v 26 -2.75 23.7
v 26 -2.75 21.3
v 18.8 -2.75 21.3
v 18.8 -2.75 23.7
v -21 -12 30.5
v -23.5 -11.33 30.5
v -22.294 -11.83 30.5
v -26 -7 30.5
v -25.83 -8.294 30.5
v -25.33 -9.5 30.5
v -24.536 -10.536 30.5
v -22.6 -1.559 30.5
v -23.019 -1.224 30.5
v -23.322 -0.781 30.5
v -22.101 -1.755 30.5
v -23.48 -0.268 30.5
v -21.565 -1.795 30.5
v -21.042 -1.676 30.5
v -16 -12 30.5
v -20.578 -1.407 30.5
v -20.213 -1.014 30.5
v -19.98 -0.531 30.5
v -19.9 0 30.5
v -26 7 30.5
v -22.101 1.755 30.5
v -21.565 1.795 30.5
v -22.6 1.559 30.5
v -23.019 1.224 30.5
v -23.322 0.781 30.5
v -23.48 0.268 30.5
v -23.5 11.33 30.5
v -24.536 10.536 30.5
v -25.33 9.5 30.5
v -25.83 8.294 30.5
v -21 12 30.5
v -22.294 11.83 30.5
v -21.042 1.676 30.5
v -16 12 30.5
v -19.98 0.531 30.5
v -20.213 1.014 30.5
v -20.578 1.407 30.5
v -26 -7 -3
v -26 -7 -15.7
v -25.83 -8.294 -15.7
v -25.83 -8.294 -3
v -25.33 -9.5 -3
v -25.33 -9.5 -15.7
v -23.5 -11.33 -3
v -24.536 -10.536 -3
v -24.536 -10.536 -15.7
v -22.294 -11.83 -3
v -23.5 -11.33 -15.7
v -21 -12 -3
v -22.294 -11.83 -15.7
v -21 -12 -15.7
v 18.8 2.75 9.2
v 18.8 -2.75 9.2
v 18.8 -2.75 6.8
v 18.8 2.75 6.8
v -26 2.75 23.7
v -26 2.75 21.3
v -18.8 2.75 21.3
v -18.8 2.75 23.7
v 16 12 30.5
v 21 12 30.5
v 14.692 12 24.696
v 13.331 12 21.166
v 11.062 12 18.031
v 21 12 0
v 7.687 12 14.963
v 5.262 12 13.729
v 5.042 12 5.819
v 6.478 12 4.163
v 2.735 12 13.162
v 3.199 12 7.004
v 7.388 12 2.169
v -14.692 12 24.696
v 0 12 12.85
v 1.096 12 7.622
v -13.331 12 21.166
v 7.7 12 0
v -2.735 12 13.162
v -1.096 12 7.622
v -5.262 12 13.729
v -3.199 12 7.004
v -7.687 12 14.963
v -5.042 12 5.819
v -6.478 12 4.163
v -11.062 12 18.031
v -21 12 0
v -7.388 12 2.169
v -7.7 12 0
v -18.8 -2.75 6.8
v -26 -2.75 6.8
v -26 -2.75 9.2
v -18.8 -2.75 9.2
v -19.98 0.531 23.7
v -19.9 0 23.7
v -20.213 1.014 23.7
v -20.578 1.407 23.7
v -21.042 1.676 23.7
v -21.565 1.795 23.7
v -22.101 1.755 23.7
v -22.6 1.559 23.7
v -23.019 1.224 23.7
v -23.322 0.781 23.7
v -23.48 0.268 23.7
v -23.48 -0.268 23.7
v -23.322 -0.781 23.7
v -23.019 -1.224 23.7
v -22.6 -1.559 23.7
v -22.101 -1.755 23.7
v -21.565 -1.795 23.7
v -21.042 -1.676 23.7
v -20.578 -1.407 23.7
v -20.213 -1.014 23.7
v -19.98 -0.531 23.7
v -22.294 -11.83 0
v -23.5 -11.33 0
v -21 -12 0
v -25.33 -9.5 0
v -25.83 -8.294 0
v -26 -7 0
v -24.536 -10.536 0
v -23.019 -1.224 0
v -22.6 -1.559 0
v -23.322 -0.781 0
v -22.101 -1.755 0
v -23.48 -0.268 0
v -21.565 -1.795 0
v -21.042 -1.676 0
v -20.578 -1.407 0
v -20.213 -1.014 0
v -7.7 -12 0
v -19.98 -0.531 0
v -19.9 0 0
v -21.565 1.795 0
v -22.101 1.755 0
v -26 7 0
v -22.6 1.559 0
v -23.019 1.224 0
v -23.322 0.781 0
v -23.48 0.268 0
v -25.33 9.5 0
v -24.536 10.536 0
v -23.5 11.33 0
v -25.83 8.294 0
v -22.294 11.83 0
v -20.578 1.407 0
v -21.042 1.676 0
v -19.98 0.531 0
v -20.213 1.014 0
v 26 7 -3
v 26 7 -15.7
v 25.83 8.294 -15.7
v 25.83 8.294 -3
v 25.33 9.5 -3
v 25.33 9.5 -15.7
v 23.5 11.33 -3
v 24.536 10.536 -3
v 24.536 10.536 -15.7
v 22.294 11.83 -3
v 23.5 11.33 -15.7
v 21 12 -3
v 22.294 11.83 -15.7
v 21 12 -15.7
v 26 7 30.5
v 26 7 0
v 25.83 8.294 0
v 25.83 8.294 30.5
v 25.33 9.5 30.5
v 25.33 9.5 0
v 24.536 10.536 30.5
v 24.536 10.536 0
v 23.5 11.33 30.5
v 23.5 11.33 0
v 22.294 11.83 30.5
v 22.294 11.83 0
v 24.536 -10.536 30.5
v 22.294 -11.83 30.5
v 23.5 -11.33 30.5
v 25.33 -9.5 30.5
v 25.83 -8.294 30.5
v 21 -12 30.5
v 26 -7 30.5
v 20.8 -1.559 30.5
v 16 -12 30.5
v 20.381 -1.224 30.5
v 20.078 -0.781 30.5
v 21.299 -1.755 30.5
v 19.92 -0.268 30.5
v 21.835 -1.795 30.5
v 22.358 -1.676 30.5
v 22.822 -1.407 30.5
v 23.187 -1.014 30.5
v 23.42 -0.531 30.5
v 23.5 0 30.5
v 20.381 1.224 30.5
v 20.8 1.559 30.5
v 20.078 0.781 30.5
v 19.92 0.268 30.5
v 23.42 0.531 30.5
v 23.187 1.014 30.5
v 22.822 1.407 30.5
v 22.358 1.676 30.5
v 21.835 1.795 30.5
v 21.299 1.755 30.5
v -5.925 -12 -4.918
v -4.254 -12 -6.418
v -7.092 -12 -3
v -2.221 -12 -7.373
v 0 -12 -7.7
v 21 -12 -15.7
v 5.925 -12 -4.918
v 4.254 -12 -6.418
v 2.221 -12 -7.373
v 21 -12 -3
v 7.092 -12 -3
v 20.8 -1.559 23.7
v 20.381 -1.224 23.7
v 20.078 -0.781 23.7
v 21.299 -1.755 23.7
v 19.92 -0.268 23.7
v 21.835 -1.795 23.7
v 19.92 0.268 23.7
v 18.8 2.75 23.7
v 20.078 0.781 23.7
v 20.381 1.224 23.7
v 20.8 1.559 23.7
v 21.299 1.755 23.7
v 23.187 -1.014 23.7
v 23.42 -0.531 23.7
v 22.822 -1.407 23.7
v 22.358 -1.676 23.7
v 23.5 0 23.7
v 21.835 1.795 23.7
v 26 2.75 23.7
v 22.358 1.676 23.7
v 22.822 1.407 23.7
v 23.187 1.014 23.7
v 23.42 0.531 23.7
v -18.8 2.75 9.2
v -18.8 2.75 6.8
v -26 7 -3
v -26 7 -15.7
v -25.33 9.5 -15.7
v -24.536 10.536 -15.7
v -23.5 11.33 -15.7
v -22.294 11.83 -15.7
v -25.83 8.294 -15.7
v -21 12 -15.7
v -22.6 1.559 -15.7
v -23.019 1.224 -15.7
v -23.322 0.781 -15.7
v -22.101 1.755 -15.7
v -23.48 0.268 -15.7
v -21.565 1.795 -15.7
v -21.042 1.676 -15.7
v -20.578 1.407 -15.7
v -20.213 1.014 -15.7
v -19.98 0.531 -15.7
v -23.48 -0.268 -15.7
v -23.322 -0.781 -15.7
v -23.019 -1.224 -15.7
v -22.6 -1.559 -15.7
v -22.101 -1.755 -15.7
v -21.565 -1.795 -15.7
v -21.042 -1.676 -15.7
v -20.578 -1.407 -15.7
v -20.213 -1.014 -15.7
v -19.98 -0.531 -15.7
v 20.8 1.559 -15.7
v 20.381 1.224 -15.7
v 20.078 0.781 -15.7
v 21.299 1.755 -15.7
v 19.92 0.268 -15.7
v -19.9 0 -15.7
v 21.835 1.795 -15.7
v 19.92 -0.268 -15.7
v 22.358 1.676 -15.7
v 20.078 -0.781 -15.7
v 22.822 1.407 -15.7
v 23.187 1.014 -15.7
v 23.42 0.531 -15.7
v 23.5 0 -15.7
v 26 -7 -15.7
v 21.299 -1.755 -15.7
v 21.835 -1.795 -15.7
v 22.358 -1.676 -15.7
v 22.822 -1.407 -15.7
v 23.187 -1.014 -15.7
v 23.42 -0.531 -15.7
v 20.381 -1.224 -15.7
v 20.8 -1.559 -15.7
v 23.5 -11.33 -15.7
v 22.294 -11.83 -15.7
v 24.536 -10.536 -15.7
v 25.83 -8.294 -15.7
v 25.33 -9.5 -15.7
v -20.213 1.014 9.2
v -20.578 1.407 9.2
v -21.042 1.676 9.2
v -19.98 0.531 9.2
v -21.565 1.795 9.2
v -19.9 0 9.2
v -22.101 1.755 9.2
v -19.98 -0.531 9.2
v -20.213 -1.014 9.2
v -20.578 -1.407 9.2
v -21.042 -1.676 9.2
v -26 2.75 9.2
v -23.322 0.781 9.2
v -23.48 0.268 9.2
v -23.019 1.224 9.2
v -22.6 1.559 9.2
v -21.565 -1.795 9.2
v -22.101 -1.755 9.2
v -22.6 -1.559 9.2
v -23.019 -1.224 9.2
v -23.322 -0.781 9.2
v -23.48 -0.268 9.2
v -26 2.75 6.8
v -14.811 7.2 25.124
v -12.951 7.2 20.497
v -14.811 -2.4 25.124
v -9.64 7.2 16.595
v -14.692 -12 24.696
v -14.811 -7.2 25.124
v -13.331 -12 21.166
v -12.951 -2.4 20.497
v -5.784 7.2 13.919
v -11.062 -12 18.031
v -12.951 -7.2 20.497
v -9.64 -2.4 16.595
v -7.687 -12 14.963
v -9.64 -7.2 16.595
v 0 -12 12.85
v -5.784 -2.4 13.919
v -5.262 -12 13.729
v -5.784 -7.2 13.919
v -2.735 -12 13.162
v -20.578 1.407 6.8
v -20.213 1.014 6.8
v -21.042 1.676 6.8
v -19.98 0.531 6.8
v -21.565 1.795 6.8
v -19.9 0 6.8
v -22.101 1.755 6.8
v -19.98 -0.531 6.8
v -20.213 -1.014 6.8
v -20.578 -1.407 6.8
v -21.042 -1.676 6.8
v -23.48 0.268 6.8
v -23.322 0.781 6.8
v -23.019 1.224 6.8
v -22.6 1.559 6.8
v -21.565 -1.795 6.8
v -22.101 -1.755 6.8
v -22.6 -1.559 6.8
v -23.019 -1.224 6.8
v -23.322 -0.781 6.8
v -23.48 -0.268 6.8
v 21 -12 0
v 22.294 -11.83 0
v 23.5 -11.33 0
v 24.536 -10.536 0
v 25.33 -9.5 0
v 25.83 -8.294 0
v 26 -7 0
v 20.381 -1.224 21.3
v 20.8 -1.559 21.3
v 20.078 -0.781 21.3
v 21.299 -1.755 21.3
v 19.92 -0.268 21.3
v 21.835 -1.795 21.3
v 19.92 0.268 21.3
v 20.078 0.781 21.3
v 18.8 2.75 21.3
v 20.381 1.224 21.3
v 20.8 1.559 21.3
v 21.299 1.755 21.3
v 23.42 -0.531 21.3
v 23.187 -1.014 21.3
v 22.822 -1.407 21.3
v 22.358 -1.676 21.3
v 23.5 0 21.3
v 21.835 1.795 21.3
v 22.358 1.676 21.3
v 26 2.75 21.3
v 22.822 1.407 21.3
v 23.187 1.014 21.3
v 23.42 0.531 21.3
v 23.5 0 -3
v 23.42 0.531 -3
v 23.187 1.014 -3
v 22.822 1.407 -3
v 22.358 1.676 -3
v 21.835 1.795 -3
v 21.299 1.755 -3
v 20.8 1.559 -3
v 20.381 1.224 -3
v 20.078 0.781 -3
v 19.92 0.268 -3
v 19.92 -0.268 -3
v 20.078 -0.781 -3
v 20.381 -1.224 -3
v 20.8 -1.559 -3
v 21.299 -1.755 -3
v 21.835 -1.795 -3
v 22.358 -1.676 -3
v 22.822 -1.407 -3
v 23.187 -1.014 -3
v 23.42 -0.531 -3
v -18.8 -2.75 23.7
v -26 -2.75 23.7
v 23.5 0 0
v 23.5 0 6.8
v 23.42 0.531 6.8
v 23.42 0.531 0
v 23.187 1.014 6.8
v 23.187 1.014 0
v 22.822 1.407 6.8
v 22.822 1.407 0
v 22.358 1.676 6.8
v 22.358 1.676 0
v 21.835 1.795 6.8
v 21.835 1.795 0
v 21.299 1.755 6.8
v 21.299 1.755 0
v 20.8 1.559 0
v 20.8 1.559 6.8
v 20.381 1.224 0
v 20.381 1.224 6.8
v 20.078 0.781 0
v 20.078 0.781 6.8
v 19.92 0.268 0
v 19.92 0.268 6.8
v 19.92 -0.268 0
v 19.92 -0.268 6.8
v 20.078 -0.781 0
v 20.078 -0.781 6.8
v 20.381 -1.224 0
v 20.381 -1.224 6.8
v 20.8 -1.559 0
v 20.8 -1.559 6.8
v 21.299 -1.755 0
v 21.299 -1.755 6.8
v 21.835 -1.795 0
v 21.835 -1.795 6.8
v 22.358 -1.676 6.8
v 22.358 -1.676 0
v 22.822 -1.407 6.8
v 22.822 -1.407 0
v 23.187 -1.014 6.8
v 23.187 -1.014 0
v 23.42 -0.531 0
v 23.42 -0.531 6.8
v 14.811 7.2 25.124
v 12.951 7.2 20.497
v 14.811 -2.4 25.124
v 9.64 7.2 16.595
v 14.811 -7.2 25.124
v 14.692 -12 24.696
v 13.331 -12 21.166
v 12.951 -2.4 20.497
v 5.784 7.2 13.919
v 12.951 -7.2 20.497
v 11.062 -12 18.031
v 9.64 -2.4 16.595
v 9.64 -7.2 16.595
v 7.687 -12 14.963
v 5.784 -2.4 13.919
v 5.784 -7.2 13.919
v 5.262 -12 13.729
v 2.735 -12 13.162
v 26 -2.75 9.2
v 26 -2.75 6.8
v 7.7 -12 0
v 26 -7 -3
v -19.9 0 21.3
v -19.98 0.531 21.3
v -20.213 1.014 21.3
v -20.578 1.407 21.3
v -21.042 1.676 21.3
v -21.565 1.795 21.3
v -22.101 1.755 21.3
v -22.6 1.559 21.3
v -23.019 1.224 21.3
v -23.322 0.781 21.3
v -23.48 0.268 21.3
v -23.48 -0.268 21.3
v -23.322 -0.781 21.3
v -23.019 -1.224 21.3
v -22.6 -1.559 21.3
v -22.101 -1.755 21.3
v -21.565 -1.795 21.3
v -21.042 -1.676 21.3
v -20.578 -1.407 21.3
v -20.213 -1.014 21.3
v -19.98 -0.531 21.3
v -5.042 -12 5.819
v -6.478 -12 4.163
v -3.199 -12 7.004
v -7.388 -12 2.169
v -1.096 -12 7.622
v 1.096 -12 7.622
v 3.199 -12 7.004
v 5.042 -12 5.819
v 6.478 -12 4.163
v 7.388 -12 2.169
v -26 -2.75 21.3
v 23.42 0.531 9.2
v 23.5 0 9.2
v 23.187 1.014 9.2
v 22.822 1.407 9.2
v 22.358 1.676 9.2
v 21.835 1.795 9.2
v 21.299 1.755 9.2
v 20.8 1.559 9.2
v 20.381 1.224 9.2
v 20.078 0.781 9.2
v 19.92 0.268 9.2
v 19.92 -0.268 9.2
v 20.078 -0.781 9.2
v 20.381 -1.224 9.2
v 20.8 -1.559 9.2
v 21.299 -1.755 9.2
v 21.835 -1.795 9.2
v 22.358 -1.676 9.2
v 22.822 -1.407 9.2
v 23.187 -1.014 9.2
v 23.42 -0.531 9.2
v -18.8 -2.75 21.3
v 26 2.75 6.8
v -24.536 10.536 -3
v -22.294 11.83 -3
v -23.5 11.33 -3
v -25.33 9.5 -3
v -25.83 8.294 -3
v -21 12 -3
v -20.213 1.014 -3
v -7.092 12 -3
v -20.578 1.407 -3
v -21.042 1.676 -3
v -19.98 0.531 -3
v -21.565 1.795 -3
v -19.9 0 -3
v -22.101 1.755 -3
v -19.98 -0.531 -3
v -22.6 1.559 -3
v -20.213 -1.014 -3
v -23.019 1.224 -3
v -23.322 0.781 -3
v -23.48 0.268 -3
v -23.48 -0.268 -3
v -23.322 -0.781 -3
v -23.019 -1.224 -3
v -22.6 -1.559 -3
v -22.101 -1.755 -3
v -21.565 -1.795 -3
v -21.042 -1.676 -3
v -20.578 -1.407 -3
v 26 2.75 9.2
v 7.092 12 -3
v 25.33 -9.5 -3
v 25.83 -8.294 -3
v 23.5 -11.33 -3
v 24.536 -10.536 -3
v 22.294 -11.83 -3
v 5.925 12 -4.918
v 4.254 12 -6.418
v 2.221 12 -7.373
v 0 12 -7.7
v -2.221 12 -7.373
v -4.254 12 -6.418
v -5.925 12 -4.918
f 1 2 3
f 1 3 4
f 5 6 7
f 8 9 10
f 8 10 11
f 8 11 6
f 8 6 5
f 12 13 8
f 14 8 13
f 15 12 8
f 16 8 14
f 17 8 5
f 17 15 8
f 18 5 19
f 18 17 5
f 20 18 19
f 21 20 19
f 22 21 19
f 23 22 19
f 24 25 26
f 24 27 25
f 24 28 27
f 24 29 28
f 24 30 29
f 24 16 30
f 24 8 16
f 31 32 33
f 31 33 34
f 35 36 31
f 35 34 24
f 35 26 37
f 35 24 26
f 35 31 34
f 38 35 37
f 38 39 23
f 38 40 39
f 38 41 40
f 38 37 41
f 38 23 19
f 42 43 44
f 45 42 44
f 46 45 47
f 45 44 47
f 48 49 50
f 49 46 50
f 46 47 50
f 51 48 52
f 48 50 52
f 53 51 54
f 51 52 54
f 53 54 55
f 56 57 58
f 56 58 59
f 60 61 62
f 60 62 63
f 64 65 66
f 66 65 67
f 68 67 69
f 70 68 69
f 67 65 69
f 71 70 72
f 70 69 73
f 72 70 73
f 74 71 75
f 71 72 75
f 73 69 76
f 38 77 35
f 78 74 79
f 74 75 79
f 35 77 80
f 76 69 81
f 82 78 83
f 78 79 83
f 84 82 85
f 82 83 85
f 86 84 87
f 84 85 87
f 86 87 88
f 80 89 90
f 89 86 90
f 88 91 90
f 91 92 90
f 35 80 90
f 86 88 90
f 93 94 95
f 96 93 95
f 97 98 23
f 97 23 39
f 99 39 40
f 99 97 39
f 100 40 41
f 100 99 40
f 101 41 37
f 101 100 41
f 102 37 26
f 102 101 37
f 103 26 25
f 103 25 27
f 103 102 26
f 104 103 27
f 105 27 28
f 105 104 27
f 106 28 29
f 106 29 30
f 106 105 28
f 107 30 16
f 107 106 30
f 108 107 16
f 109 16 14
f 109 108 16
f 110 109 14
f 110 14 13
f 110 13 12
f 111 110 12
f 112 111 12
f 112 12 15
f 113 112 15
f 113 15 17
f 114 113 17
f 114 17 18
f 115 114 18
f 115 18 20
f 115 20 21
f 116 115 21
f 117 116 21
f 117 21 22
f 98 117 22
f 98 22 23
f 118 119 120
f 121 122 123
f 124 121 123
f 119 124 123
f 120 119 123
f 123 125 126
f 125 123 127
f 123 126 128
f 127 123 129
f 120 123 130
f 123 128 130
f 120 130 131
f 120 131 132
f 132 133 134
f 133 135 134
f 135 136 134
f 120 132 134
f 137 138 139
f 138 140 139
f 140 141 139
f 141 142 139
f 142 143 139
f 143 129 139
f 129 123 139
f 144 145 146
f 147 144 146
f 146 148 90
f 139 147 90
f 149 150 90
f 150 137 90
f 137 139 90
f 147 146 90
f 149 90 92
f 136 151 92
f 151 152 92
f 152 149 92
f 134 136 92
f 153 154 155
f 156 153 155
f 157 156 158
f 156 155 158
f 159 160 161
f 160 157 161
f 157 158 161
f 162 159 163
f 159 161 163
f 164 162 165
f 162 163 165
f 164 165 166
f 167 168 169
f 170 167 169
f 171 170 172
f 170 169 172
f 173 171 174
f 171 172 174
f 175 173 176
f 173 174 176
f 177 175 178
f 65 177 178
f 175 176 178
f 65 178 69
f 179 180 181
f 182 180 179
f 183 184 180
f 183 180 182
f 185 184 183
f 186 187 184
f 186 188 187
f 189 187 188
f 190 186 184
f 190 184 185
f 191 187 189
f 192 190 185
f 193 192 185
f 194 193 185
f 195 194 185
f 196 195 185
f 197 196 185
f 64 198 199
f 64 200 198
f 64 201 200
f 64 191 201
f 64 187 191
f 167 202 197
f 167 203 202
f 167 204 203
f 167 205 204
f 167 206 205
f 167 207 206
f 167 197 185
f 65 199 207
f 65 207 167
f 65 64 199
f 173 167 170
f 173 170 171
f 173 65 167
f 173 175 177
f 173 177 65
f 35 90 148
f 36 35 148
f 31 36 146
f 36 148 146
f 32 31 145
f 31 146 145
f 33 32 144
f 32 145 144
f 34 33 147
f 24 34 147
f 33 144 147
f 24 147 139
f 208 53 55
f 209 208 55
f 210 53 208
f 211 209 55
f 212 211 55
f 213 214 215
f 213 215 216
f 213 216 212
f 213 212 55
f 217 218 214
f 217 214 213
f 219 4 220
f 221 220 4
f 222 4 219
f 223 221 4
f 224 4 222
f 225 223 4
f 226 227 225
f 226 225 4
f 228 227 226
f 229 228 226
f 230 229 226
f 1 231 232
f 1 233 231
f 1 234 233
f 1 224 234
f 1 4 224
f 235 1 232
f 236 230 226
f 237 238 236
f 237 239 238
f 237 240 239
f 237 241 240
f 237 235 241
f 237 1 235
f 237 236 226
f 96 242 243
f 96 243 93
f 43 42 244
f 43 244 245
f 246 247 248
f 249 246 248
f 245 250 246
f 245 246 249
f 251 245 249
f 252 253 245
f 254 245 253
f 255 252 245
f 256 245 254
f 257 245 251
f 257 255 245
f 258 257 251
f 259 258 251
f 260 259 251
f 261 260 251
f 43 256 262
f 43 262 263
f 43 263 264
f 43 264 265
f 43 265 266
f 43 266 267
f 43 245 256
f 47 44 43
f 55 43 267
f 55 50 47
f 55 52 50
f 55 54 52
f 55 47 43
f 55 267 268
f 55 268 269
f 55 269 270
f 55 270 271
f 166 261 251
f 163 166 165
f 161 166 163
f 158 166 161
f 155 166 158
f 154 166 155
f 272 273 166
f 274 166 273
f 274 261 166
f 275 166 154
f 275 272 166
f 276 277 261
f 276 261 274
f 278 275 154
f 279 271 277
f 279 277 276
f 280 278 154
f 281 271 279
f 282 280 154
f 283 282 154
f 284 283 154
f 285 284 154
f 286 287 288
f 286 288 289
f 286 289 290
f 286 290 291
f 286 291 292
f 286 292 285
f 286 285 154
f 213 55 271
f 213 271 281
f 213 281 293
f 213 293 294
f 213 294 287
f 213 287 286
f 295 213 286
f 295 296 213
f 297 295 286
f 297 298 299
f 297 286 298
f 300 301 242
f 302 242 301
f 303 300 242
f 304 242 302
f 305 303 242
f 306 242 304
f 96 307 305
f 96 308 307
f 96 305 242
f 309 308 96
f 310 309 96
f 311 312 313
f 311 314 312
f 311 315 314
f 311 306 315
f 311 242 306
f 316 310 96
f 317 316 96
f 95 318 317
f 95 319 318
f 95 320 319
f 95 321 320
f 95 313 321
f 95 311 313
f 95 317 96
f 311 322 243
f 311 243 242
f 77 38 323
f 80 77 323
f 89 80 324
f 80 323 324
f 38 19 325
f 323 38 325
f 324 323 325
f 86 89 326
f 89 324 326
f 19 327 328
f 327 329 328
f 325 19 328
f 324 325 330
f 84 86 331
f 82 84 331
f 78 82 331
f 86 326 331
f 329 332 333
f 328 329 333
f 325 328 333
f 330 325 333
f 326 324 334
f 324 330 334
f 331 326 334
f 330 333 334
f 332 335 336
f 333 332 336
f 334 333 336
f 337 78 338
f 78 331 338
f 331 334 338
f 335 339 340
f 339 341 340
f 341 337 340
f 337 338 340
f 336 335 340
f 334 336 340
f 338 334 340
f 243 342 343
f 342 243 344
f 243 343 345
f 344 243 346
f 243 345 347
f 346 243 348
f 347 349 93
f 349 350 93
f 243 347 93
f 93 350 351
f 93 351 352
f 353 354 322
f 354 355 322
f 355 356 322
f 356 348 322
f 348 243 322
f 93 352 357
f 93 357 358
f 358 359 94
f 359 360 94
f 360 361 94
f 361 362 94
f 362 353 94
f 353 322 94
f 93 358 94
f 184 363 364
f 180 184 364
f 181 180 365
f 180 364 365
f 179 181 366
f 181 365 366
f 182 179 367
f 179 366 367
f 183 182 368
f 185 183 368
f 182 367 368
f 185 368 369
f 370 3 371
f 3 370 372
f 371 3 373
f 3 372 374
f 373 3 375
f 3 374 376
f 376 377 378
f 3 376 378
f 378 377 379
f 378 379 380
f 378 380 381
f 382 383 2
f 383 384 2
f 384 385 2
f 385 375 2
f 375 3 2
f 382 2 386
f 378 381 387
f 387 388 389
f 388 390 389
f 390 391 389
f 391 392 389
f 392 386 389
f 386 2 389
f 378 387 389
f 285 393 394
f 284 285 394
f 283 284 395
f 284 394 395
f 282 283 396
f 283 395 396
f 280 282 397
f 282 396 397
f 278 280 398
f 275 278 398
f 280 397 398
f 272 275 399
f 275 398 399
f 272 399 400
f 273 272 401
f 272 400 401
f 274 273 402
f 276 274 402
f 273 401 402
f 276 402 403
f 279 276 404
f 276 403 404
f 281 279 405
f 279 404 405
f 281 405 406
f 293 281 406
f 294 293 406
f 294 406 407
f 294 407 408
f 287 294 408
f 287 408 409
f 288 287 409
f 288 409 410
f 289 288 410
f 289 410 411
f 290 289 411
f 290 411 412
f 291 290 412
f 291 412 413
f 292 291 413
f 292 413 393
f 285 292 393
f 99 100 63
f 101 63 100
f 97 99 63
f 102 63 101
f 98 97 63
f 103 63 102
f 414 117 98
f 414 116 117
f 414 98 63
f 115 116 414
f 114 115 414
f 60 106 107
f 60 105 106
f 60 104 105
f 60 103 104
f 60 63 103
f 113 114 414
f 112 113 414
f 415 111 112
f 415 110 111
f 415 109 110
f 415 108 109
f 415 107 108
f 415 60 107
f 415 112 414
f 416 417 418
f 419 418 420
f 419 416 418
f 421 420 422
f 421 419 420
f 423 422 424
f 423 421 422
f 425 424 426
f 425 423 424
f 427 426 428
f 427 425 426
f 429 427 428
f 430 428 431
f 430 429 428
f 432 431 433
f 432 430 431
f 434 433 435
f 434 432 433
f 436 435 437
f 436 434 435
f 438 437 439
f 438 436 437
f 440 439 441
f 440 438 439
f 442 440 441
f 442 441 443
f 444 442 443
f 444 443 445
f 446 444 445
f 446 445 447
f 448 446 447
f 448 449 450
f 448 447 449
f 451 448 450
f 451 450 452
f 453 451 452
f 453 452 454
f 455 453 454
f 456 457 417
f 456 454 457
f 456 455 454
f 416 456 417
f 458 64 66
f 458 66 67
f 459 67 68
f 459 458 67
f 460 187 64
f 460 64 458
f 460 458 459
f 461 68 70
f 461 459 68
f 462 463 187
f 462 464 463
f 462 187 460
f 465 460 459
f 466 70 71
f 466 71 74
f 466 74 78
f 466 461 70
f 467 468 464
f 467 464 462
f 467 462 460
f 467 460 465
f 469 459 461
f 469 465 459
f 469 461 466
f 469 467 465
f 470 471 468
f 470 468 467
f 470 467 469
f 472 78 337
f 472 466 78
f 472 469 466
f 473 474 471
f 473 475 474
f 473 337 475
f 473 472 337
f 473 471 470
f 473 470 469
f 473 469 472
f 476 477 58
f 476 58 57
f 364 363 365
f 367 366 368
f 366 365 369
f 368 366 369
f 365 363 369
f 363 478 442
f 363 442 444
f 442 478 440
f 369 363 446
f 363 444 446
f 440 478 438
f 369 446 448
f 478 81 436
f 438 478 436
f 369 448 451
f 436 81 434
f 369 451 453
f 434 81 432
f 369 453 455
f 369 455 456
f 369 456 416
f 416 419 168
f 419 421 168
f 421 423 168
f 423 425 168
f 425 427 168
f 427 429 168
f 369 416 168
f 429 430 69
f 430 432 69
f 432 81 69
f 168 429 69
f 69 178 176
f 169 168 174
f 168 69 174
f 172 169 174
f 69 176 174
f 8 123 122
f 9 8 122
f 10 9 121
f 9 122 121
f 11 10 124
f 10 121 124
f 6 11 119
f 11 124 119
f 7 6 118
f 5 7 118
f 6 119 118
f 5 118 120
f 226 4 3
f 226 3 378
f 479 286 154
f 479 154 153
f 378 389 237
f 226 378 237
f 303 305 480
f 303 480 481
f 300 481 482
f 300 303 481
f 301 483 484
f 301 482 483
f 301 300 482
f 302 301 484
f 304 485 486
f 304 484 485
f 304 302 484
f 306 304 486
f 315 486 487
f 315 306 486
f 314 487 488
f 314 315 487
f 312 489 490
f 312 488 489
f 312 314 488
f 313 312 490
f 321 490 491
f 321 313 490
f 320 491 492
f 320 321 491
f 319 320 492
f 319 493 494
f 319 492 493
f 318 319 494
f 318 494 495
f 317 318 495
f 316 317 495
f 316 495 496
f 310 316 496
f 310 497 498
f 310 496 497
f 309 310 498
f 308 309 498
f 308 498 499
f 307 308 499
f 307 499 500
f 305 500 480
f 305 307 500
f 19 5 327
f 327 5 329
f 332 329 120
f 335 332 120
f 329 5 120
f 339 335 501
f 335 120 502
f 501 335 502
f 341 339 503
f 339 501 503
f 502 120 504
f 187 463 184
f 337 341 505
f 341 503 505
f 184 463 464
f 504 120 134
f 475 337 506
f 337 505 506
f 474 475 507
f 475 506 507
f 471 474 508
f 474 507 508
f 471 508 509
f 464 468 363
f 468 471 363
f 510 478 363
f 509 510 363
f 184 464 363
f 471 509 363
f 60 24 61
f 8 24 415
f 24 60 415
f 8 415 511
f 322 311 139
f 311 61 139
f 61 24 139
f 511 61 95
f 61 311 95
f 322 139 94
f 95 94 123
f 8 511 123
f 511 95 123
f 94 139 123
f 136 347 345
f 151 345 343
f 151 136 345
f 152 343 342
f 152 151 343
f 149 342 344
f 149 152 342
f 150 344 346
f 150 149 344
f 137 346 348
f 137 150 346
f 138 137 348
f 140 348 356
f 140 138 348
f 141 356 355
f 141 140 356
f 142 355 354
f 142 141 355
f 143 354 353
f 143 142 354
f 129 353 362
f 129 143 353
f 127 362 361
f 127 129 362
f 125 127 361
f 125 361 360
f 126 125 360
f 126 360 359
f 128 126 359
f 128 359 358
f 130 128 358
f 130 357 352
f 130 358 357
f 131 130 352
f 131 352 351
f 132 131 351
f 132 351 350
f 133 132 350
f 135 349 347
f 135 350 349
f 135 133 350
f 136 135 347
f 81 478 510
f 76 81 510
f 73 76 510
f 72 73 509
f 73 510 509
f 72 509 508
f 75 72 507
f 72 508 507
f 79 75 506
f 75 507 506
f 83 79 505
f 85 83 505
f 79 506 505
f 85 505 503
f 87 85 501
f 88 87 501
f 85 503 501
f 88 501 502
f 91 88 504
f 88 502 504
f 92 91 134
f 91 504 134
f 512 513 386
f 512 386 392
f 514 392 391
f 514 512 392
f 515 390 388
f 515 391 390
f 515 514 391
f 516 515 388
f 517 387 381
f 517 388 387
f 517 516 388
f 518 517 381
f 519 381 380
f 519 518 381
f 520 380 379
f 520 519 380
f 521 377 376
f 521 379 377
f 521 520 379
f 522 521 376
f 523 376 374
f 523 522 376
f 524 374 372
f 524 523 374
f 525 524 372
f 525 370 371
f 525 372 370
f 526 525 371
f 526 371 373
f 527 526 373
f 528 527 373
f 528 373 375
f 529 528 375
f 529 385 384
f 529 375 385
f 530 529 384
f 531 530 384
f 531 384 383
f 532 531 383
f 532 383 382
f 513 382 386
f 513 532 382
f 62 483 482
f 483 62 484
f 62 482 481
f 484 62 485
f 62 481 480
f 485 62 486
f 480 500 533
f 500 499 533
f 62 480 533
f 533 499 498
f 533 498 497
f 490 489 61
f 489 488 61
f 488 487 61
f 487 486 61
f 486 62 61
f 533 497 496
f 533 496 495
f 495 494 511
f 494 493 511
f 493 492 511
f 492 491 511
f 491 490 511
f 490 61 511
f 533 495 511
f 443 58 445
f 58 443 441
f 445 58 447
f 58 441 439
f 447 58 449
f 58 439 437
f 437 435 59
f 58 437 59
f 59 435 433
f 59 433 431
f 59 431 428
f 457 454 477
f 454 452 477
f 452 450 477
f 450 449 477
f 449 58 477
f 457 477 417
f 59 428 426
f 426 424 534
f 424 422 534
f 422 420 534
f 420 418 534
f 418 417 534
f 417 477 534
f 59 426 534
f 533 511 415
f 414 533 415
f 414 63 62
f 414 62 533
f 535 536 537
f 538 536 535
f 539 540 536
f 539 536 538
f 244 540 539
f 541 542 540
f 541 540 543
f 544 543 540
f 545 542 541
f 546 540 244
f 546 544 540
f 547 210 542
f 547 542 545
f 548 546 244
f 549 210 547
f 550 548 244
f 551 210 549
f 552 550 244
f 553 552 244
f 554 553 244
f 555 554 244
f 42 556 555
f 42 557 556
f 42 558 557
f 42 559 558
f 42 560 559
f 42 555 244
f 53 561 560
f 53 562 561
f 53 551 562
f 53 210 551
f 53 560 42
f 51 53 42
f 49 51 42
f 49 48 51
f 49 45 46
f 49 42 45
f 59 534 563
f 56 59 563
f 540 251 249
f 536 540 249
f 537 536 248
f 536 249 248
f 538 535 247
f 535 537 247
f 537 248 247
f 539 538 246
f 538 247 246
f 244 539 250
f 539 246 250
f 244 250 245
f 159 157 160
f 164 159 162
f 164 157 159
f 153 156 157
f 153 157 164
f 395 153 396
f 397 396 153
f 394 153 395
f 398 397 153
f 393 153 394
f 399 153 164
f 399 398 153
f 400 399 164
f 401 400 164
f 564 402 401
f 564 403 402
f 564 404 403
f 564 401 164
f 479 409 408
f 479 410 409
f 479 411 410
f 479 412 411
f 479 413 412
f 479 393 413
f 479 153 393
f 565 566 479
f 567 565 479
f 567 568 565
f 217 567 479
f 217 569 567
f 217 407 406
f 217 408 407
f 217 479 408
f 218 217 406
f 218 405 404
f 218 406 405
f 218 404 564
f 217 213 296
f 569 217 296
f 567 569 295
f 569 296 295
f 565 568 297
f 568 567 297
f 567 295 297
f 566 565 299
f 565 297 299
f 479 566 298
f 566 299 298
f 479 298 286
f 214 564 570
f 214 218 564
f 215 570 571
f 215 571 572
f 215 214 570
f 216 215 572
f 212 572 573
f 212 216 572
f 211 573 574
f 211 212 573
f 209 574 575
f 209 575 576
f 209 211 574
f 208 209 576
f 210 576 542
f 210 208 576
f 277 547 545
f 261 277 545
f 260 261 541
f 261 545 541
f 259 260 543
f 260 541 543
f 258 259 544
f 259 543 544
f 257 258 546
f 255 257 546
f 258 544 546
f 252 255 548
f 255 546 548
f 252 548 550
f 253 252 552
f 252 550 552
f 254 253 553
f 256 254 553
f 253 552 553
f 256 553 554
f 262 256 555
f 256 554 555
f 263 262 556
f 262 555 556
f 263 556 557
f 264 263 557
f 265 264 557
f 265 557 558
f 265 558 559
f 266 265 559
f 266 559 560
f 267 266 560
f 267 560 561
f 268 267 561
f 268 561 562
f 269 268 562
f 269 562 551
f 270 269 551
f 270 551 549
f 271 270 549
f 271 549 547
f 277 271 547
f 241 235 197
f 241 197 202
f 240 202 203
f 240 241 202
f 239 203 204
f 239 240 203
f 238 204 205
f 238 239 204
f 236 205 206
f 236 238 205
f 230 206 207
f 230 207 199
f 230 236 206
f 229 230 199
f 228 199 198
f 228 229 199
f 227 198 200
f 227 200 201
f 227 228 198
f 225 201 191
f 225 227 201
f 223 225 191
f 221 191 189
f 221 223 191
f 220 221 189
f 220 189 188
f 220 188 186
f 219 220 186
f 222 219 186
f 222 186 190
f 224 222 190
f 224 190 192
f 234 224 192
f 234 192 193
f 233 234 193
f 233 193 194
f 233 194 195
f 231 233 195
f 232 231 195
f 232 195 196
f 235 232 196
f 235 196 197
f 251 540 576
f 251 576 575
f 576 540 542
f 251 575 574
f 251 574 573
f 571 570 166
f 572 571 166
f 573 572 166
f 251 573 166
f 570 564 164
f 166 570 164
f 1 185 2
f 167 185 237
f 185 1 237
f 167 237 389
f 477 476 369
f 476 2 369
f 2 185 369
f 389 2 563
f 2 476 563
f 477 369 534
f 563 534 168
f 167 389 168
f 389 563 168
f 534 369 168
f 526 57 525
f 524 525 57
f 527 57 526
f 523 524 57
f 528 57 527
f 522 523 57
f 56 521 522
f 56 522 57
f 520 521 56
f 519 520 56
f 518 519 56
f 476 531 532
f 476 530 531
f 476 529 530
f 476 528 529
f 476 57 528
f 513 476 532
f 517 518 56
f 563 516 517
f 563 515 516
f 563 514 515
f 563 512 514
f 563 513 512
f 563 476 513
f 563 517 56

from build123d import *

# Parameters (mm, degrees)
F0_R      = 1.8
F1_DEPTH  = 30.5
F3_DEPTH  = 24
F4_DEPTH  = 24
F5_W      = 5.5
F5_H      = 2.4
F6_DEPTH  = 7.2
F7_W      = 5.5
F7_H      = 2.4
F8_DEPTH  = 7.2
F10_DEPTH = 12
F12_DEPTH = 15.7
F13_DEPTH = 25


with BuildPart() as f1:
    # F0 (on Top) → F1 (new body)
    with BuildSketch(Plane.XY):
        with BuildLine():
            Line((21, 12), (-21, 12))
            ThreePointArc((-21, 12), (-24.5355339059, 10.5355339059), (-26, 7))
            Line((-26, 7), (-26, -7))
            ThreePointArc((-26, -7), (-24.5355339059, -10.5355339059), (-21, -12))
            Line((-21, -12), (21, -12))
            ThreePointArc((21, -12), (24.5355339059, -10.5355339059), (26, -7))
            Line((26, -7), (26, 7))
            ThreePointArc((26, 7), (24.5355339059, 10.5355339059), (21, 12))
        make_face()
        with Locations((-21.7, 0)):
            Circle(F0_R, mode=Mode.SUBTRACT)
        with Locations((21.7, 0)):
            Circle(F0_R, mode=Mode.SUBTRACT)
    extrude(amount=F1_DEPTH)

    # F2 (on face) → F3 (cut)
    with BuildSketch(Plane.XZ.offset(12)):
        with BuildLine():
            Line((-7.7, 0), (7.7, 0))
            ThreePointArc((7.7, 0), (0, 7.7), (-7.7, 0))
        make_face()
    extrude(amount=-F3_DEPTH, mode=Mode.SUBTRACT)

    # F2 (on face) → F4 (cut)
    with BuildSketch(Plane.XZ.offset(12)):
        with BuildLine():
            add(Edge.make_bspline(
                [(16, 30.5), (15.6402049563, 28.676106739), (14.9380037687, 25.116469005), (13.2652945813, 20.3413719416), (9.7075187386, 16.503128812), (5.9474712871, 13.4288235739), (2.0555929251, 13.0500557188), (0, 12.85)],
                knots=[0, 0, 0, 0, 0.2052327864, 0.4005466691, 0.5983966169, 0.7878831258, 1, 1, 1, 1], degree=3))
            Line((16, 30.5), (0, 30.5))
            Line((0, 30.5), (-16, 30.5))
            add(Edge.make_bspline(
                [(-16, 30.5), (-15.6402049563, 28.676106739), (-14.9380037687, 25.116469005), (-13.2652945813, 20.3413719416), (-9.7075187386, 16.503128812), (-5.9474712871, 13.4288235739), (-2.0555929251, 13.0500557188), (0, 12.85)],
                knots=[0, 0, 0, 0, 0.2052327864, 0.4005466691, 0.5983966169, 0.7878831258, 1, 1, 1, 1], degree=3))
        make_face()
    extrude(amount=-F4_DEPTH, mode=Mode.SUBTRACT)

    # F5 (on face) → F6 (cut)
    with BuildSketch(Plane(origin=(-26, 0, 0), x_dir=(0, -1, 0), z_dir=(-1, 0, 0))):
        with Locations((0, 8)):
            Rectangle(F5_W, F5_H)
        with Locations((0, 22.5)):
            Rectangle(F5_W, F5_H)
    extrude(amount=-F6_DEPTH, mode=Mode.SUBTRACT)

    # F7 (on face) → F8 (cut)
    with BuildSketch(Plane.YZ.offset(26)):
        with Locations((0, 8)):
            Rectangle(F7_W, F7_H)
        with Locations((0, 22.5)):
            Rectangle(F7_W, F7_H)
    extrude(amount=-F8_DEPTH, mode=Mode.SUBTRACT)


with BuildPart() as f10:
    # F9 (on Front) → F10 (new body, symmetric)
    with BuildSketch(Plane.XZ):
        with BuildLine():
            Line((-26, -3), (-26, -15.7))
            Line((-26, -15.7), (26, -15.7))
            Line((26, -15.7), (26, -3))
            Line((26, -3), (7.0915442606, -3))
            ThreePointArc((7.0915442606, -3), (0, -7.7), (-7.0915442606, -3))
            Line((-7.0915442606, -3), (-26, -3))
        make_face()
    extrude(amount=F10_DEPTH, both=True)

    # F11 (on face) → F12 (cut)
    with BuildSketch(Plane(origin=(0, 0, -15.7), x_dir=(1, 0, 0), z_dir=(0, 0, -1))):
        with BuildLine():
            Line((26, 12), (21, 12))
            ThreePointArc((21, 12), (24.5355339059, 10.5355339059), (26, 7))
            Line((26, 7), (26, 12))
        make_face()
        with BuildLine():
            Line((26, -12), (26, -7))
            ThreePointArc((26, -7), (24.5355339059, -10.5355339059), (21, -12))
            Line((21, -12), (26, -12))
        make_face()
        with BuildLine():
            ThreePointArc((-21, -12), (-24.5355339059, -10.5355339059), (-26, -7))
            Line((-26, -7), (-26, -12))
            Line((-26, -12), (-21, -12))
        make_face()
        with BuildLine():
            ThreePointArc((-26, 7), (-24.5355339059, 10.5355339059), (-21, 12))
            Line((-21, 12), (-26, 12))
            Line((-26, 12), (-26, 7))
        make_face()
    extrude(amount=-F12_DEPTH, mode=Mode.SUBTRACT)

    # F0 (on Top) → F13 (cut)
    with BuildSketch(Plane.XY):
        with Locations((-21.7, 0)):
            Circle(F0_R)
        with Locations((21.7, 0)):
            Circle(F0_R)
    extrude(amount=-F13_DEPTH, mode=Mode.SUBTRACT)


solid = Compound([f1.part, f10.part])
